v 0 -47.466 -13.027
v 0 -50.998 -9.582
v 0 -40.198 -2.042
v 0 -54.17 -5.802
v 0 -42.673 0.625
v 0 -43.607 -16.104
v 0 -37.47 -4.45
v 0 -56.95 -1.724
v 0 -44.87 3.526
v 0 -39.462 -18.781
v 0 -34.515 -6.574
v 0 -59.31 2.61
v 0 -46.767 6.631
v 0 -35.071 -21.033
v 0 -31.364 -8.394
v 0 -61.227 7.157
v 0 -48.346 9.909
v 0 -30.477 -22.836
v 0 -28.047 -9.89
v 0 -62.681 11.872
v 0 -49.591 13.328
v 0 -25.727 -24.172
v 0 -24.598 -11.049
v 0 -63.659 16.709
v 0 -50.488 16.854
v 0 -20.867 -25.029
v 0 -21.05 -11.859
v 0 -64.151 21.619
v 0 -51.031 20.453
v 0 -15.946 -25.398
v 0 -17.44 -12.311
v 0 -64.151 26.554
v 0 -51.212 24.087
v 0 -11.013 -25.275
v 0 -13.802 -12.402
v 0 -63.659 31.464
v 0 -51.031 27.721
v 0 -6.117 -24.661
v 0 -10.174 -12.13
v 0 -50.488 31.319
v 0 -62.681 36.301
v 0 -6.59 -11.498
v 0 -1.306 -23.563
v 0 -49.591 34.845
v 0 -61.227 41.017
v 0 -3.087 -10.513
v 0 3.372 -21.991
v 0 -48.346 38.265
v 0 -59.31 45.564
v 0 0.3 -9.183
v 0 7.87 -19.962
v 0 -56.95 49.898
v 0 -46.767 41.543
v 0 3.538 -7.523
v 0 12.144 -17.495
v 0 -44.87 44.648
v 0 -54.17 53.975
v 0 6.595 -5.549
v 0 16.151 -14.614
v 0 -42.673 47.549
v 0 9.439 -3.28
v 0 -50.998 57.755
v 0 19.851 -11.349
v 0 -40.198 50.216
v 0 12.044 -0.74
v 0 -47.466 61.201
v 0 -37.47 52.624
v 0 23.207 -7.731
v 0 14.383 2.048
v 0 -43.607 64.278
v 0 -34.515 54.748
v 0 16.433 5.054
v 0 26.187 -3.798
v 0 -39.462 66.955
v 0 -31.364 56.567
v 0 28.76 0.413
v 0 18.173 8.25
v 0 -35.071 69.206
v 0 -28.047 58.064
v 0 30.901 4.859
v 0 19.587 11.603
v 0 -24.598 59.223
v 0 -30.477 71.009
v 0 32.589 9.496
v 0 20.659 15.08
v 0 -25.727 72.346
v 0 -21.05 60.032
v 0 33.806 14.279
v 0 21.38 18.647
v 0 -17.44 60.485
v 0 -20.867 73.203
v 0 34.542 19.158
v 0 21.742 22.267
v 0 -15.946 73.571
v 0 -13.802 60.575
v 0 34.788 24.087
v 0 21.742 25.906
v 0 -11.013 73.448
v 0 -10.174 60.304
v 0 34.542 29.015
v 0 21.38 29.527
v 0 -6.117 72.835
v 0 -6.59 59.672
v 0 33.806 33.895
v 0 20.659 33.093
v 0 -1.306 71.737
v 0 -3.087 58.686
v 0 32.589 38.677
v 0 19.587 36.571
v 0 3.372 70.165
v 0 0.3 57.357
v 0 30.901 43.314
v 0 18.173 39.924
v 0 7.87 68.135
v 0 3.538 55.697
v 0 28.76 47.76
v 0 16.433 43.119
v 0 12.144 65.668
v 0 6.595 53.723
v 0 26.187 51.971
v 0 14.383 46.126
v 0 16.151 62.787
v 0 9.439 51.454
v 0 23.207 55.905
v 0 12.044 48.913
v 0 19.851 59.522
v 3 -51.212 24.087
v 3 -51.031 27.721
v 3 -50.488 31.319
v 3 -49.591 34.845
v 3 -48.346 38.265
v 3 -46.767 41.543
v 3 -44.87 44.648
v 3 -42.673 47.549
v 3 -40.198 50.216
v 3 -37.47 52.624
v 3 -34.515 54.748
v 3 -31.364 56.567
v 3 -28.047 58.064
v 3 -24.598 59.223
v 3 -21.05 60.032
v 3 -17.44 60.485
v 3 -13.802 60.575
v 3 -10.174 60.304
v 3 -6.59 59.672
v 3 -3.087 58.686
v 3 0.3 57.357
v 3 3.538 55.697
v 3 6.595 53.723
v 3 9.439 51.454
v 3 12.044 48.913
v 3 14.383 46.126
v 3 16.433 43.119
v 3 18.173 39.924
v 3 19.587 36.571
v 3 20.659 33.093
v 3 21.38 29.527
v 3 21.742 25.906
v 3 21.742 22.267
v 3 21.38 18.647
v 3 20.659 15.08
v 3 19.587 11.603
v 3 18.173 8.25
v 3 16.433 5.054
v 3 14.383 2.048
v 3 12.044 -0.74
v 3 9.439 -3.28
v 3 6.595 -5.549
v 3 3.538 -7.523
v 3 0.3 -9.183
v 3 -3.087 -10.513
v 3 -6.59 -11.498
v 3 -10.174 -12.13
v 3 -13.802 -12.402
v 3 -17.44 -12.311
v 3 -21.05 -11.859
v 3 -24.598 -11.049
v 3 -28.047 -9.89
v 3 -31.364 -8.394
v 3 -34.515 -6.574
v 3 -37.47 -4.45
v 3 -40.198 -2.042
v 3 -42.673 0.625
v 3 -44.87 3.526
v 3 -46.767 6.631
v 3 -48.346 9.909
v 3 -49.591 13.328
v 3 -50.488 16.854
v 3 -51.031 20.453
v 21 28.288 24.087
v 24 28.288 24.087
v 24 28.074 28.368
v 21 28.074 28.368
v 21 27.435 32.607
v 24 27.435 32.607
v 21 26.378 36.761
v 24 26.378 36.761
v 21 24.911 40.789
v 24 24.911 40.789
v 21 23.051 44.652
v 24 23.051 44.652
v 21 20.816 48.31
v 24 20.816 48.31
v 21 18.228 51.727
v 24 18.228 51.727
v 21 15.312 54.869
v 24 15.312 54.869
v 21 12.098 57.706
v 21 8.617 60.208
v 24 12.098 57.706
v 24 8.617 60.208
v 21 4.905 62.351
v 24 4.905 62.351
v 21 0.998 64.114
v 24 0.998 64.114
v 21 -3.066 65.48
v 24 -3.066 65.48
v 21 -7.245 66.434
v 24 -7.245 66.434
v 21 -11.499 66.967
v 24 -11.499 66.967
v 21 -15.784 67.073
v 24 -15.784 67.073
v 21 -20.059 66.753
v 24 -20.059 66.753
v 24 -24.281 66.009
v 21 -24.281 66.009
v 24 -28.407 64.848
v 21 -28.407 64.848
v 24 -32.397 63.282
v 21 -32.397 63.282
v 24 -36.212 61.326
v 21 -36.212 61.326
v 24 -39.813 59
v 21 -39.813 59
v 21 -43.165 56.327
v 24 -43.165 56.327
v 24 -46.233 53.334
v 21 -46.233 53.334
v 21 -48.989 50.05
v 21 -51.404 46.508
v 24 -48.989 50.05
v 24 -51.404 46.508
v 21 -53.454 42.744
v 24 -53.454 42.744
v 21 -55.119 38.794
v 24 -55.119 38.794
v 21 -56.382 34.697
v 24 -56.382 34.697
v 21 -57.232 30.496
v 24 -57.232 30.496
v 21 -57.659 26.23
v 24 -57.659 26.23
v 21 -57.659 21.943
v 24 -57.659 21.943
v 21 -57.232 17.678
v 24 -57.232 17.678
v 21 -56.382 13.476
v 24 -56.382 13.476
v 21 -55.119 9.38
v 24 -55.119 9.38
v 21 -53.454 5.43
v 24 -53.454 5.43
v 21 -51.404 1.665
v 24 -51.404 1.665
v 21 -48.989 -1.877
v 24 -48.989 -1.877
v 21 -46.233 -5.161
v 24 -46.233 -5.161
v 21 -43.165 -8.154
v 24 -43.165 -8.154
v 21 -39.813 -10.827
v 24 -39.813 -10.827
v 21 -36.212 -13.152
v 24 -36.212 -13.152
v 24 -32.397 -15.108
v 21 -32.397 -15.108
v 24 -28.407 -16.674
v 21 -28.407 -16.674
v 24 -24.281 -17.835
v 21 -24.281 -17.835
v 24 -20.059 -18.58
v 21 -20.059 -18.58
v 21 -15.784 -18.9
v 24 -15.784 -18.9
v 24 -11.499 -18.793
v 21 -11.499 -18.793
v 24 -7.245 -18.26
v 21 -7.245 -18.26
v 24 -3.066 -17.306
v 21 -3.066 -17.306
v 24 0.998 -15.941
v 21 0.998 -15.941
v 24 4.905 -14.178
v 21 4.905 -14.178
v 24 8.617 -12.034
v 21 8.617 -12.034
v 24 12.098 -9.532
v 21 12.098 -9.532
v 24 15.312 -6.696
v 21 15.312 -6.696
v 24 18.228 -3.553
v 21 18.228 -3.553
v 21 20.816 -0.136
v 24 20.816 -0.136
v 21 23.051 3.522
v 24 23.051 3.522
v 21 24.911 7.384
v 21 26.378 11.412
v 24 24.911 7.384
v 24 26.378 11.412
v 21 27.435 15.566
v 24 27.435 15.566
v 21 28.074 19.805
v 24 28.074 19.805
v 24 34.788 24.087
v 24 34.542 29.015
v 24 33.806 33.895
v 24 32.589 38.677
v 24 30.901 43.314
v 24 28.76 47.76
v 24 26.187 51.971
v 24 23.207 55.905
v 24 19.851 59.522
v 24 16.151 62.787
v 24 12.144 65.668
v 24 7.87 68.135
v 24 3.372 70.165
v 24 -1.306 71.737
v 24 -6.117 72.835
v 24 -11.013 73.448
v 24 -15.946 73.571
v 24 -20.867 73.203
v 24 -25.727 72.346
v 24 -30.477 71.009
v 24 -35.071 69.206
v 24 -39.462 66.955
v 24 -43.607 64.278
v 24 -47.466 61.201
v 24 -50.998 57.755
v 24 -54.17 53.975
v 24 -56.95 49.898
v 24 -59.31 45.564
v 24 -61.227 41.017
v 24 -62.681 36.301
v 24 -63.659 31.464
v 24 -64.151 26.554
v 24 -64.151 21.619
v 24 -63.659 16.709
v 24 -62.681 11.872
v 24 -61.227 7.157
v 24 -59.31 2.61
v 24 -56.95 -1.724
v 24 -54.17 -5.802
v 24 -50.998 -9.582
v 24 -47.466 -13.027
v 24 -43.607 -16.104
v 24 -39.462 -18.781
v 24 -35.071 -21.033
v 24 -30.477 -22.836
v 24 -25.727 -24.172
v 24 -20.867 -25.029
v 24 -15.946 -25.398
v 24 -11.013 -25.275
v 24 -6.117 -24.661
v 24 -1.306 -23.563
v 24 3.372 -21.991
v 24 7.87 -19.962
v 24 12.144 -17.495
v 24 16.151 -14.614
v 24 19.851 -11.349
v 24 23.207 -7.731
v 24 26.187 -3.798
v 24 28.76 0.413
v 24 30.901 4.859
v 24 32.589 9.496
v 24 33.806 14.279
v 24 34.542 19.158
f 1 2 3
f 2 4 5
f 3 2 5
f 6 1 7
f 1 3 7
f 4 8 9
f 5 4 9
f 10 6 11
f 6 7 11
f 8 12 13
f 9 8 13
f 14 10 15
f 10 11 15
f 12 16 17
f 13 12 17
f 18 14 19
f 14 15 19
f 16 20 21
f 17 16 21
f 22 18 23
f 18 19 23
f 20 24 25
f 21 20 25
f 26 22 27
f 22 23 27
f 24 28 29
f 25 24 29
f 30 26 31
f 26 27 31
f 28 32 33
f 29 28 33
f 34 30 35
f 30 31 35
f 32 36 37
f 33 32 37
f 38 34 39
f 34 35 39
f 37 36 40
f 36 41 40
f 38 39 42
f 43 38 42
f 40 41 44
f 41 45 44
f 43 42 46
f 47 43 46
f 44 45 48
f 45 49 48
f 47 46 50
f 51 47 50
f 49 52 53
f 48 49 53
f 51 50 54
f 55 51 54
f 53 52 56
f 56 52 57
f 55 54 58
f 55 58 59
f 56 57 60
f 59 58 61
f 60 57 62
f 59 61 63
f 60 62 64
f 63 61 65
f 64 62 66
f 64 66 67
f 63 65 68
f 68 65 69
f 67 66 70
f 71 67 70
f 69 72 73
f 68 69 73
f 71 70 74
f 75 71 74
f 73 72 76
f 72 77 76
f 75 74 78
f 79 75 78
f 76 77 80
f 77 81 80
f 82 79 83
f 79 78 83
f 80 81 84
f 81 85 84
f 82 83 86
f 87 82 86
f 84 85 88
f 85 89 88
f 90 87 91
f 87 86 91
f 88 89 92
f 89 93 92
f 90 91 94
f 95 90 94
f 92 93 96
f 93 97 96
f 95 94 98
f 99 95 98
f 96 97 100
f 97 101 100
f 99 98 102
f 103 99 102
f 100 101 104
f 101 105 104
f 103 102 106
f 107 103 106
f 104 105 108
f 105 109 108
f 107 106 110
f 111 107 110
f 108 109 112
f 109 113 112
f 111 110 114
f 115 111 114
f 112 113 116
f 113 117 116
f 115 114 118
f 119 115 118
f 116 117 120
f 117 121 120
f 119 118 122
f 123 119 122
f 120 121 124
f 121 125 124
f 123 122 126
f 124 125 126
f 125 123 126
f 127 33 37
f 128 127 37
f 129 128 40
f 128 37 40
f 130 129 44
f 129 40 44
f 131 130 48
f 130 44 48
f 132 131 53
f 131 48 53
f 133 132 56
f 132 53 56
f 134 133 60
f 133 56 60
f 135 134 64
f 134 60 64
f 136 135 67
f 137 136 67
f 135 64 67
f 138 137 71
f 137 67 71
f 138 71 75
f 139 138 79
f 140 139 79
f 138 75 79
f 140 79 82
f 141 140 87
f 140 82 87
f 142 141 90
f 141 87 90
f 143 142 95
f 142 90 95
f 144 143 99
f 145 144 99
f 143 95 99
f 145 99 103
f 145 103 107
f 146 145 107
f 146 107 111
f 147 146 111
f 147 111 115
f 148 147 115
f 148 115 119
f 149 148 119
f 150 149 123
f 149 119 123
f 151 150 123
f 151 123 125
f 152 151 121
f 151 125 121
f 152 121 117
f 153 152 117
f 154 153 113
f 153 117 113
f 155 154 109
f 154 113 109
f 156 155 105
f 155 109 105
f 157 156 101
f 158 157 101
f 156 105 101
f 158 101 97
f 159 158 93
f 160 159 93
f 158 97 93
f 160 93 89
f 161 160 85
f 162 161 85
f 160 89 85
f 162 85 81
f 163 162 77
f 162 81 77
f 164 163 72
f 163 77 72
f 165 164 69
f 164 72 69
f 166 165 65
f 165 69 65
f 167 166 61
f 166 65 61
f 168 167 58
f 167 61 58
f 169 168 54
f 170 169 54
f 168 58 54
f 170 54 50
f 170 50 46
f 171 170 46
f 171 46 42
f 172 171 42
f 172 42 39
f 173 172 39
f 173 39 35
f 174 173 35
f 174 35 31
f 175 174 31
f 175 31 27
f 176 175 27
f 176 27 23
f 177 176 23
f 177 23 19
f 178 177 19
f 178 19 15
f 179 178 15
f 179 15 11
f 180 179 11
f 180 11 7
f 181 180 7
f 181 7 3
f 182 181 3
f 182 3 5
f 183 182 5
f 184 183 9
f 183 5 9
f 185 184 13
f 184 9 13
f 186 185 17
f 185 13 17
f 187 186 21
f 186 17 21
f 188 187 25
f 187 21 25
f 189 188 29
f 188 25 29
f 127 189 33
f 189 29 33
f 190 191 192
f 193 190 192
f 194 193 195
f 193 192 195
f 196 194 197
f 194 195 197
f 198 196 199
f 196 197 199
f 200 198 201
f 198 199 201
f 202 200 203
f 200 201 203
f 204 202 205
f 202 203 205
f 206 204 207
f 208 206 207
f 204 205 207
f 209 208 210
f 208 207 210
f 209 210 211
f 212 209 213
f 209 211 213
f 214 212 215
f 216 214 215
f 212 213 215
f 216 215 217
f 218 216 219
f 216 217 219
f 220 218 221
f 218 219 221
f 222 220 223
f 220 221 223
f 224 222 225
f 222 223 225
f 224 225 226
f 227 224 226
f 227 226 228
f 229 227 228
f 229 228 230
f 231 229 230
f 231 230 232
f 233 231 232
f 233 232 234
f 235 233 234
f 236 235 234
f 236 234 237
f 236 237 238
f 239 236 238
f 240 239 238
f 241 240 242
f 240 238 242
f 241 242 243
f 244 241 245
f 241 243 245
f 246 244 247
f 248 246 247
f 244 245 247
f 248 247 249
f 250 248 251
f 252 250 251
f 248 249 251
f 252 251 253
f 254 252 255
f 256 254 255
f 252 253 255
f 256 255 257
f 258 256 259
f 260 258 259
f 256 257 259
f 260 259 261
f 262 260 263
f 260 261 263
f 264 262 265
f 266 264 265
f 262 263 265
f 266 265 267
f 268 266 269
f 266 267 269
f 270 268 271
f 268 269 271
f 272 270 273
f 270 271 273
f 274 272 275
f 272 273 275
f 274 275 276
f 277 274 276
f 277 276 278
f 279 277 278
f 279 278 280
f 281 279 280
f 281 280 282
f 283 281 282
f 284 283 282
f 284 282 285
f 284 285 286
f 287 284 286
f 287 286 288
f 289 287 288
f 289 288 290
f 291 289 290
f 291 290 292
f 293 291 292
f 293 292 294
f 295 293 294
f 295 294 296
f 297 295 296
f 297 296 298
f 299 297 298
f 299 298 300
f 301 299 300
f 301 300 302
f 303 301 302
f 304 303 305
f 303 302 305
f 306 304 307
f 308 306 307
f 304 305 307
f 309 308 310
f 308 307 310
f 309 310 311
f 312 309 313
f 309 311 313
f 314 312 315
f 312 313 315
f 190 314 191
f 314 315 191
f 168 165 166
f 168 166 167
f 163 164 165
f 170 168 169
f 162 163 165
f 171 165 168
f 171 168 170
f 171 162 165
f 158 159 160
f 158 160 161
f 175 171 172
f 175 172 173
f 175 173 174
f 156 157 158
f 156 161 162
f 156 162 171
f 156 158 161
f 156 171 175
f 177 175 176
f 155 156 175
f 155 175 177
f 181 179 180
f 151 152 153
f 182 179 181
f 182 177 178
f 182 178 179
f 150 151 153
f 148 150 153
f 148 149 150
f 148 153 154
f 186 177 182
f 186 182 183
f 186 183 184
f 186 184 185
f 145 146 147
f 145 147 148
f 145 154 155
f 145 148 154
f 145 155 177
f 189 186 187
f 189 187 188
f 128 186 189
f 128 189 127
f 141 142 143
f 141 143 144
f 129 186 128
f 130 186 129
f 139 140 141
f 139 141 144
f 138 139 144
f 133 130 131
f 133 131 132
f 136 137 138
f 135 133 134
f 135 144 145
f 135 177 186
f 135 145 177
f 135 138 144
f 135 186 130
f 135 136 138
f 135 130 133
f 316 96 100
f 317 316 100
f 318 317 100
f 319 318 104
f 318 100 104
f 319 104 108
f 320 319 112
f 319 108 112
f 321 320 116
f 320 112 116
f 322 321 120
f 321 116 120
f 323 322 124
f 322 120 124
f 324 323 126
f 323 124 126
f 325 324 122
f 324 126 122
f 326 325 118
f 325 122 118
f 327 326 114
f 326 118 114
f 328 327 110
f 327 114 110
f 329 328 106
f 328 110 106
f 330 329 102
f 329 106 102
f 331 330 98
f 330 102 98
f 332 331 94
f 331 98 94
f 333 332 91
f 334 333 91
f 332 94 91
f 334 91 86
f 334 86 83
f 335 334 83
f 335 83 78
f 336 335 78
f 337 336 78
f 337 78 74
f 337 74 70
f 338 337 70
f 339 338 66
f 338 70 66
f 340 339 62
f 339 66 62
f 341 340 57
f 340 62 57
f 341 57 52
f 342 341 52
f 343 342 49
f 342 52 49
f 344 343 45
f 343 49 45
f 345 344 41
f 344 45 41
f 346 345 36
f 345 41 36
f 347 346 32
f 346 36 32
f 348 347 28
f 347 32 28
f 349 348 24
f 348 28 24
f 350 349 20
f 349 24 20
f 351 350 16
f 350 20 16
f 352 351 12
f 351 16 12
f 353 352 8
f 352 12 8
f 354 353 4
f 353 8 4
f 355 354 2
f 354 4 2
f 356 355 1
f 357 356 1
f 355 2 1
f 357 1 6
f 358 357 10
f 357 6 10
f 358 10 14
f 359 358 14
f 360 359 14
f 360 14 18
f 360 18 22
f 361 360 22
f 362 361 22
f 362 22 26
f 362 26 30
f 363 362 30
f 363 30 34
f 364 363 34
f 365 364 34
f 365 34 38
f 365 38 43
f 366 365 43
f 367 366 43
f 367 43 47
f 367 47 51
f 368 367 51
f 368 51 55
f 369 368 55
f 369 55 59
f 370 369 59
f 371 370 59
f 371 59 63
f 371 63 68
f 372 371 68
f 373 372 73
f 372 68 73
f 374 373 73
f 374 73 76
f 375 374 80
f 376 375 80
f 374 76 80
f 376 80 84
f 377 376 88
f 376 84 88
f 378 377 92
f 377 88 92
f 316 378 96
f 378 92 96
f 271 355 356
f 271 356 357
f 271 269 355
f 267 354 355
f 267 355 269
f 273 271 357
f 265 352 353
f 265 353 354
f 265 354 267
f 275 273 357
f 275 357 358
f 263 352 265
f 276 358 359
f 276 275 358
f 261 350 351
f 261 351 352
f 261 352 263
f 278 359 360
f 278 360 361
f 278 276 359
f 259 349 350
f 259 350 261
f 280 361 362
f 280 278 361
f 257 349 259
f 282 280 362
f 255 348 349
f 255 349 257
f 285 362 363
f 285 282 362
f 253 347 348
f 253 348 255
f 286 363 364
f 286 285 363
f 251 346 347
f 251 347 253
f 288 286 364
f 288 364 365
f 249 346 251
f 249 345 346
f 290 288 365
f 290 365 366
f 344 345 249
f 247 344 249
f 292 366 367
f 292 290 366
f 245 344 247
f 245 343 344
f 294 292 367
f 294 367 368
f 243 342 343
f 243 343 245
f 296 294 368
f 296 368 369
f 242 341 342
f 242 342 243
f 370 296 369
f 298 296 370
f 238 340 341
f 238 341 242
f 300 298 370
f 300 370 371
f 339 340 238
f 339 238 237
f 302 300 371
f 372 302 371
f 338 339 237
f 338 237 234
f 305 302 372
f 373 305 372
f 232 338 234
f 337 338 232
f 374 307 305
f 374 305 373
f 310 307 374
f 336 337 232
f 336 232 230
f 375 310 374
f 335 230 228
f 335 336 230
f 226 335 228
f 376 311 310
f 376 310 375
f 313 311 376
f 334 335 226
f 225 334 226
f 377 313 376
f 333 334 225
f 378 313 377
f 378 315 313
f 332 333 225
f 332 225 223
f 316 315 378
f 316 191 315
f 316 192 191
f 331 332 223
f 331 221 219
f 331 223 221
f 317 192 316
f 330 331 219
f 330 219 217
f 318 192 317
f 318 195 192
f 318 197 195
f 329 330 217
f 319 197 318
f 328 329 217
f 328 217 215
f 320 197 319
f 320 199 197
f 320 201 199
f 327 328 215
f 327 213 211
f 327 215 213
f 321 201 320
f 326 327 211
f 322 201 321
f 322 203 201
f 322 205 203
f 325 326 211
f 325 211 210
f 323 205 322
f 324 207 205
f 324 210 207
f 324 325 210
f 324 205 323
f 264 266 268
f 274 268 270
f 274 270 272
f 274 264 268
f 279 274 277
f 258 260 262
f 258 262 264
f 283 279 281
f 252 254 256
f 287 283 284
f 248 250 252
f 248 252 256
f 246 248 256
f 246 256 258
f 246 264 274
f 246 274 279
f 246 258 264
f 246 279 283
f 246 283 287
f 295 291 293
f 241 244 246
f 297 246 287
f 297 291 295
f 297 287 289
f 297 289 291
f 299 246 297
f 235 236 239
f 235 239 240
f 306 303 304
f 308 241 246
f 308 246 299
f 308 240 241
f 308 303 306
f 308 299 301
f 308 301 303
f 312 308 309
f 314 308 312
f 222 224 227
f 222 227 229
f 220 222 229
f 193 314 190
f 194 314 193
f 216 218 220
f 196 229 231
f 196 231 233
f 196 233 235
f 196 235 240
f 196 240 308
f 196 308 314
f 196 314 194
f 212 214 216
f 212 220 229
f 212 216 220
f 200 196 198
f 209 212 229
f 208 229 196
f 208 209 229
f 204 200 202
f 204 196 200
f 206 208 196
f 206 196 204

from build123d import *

# Parameters (mm, degrees)
F0_R     = 49.5
F1_DEPTH = 24
F2_R     = 43
F3_DEPTH = 3
F4_R     = 36.5
F5_DEPTH = 3


with BuildPart() as f1:
    # F0 (on Right) → F1 (new body)
    with BuildSketch(Plane.YZ):
        with Locations((-14.71213, 24.086773)):
            Circle(F0_R)
    extrude(amount=F1_DEPTH)

    # F2 (on face) → F3 (cut)
    with BuildSketch(Plane.YZ.offset(24)):
        with Locations((-14.71213, 24.086773)):
            Circle(F2_R)
    extrude(amount=-F3_DEPTH, mode=Mode.SUBTRACT)

    # F4 (on face) → F5 (cut)
    with BuildSketch(Plane(origin=(0, 0, 0), x_dir=(0, -1, 0), z_dir=(-1, 0, 0))):
        with Locations((14.71213, 24.086773)):
            Circle(F4_R)
    extrude(amount=-F5_DEPTH, mode=Mode.SUBTRACT)


solid = f1.part
